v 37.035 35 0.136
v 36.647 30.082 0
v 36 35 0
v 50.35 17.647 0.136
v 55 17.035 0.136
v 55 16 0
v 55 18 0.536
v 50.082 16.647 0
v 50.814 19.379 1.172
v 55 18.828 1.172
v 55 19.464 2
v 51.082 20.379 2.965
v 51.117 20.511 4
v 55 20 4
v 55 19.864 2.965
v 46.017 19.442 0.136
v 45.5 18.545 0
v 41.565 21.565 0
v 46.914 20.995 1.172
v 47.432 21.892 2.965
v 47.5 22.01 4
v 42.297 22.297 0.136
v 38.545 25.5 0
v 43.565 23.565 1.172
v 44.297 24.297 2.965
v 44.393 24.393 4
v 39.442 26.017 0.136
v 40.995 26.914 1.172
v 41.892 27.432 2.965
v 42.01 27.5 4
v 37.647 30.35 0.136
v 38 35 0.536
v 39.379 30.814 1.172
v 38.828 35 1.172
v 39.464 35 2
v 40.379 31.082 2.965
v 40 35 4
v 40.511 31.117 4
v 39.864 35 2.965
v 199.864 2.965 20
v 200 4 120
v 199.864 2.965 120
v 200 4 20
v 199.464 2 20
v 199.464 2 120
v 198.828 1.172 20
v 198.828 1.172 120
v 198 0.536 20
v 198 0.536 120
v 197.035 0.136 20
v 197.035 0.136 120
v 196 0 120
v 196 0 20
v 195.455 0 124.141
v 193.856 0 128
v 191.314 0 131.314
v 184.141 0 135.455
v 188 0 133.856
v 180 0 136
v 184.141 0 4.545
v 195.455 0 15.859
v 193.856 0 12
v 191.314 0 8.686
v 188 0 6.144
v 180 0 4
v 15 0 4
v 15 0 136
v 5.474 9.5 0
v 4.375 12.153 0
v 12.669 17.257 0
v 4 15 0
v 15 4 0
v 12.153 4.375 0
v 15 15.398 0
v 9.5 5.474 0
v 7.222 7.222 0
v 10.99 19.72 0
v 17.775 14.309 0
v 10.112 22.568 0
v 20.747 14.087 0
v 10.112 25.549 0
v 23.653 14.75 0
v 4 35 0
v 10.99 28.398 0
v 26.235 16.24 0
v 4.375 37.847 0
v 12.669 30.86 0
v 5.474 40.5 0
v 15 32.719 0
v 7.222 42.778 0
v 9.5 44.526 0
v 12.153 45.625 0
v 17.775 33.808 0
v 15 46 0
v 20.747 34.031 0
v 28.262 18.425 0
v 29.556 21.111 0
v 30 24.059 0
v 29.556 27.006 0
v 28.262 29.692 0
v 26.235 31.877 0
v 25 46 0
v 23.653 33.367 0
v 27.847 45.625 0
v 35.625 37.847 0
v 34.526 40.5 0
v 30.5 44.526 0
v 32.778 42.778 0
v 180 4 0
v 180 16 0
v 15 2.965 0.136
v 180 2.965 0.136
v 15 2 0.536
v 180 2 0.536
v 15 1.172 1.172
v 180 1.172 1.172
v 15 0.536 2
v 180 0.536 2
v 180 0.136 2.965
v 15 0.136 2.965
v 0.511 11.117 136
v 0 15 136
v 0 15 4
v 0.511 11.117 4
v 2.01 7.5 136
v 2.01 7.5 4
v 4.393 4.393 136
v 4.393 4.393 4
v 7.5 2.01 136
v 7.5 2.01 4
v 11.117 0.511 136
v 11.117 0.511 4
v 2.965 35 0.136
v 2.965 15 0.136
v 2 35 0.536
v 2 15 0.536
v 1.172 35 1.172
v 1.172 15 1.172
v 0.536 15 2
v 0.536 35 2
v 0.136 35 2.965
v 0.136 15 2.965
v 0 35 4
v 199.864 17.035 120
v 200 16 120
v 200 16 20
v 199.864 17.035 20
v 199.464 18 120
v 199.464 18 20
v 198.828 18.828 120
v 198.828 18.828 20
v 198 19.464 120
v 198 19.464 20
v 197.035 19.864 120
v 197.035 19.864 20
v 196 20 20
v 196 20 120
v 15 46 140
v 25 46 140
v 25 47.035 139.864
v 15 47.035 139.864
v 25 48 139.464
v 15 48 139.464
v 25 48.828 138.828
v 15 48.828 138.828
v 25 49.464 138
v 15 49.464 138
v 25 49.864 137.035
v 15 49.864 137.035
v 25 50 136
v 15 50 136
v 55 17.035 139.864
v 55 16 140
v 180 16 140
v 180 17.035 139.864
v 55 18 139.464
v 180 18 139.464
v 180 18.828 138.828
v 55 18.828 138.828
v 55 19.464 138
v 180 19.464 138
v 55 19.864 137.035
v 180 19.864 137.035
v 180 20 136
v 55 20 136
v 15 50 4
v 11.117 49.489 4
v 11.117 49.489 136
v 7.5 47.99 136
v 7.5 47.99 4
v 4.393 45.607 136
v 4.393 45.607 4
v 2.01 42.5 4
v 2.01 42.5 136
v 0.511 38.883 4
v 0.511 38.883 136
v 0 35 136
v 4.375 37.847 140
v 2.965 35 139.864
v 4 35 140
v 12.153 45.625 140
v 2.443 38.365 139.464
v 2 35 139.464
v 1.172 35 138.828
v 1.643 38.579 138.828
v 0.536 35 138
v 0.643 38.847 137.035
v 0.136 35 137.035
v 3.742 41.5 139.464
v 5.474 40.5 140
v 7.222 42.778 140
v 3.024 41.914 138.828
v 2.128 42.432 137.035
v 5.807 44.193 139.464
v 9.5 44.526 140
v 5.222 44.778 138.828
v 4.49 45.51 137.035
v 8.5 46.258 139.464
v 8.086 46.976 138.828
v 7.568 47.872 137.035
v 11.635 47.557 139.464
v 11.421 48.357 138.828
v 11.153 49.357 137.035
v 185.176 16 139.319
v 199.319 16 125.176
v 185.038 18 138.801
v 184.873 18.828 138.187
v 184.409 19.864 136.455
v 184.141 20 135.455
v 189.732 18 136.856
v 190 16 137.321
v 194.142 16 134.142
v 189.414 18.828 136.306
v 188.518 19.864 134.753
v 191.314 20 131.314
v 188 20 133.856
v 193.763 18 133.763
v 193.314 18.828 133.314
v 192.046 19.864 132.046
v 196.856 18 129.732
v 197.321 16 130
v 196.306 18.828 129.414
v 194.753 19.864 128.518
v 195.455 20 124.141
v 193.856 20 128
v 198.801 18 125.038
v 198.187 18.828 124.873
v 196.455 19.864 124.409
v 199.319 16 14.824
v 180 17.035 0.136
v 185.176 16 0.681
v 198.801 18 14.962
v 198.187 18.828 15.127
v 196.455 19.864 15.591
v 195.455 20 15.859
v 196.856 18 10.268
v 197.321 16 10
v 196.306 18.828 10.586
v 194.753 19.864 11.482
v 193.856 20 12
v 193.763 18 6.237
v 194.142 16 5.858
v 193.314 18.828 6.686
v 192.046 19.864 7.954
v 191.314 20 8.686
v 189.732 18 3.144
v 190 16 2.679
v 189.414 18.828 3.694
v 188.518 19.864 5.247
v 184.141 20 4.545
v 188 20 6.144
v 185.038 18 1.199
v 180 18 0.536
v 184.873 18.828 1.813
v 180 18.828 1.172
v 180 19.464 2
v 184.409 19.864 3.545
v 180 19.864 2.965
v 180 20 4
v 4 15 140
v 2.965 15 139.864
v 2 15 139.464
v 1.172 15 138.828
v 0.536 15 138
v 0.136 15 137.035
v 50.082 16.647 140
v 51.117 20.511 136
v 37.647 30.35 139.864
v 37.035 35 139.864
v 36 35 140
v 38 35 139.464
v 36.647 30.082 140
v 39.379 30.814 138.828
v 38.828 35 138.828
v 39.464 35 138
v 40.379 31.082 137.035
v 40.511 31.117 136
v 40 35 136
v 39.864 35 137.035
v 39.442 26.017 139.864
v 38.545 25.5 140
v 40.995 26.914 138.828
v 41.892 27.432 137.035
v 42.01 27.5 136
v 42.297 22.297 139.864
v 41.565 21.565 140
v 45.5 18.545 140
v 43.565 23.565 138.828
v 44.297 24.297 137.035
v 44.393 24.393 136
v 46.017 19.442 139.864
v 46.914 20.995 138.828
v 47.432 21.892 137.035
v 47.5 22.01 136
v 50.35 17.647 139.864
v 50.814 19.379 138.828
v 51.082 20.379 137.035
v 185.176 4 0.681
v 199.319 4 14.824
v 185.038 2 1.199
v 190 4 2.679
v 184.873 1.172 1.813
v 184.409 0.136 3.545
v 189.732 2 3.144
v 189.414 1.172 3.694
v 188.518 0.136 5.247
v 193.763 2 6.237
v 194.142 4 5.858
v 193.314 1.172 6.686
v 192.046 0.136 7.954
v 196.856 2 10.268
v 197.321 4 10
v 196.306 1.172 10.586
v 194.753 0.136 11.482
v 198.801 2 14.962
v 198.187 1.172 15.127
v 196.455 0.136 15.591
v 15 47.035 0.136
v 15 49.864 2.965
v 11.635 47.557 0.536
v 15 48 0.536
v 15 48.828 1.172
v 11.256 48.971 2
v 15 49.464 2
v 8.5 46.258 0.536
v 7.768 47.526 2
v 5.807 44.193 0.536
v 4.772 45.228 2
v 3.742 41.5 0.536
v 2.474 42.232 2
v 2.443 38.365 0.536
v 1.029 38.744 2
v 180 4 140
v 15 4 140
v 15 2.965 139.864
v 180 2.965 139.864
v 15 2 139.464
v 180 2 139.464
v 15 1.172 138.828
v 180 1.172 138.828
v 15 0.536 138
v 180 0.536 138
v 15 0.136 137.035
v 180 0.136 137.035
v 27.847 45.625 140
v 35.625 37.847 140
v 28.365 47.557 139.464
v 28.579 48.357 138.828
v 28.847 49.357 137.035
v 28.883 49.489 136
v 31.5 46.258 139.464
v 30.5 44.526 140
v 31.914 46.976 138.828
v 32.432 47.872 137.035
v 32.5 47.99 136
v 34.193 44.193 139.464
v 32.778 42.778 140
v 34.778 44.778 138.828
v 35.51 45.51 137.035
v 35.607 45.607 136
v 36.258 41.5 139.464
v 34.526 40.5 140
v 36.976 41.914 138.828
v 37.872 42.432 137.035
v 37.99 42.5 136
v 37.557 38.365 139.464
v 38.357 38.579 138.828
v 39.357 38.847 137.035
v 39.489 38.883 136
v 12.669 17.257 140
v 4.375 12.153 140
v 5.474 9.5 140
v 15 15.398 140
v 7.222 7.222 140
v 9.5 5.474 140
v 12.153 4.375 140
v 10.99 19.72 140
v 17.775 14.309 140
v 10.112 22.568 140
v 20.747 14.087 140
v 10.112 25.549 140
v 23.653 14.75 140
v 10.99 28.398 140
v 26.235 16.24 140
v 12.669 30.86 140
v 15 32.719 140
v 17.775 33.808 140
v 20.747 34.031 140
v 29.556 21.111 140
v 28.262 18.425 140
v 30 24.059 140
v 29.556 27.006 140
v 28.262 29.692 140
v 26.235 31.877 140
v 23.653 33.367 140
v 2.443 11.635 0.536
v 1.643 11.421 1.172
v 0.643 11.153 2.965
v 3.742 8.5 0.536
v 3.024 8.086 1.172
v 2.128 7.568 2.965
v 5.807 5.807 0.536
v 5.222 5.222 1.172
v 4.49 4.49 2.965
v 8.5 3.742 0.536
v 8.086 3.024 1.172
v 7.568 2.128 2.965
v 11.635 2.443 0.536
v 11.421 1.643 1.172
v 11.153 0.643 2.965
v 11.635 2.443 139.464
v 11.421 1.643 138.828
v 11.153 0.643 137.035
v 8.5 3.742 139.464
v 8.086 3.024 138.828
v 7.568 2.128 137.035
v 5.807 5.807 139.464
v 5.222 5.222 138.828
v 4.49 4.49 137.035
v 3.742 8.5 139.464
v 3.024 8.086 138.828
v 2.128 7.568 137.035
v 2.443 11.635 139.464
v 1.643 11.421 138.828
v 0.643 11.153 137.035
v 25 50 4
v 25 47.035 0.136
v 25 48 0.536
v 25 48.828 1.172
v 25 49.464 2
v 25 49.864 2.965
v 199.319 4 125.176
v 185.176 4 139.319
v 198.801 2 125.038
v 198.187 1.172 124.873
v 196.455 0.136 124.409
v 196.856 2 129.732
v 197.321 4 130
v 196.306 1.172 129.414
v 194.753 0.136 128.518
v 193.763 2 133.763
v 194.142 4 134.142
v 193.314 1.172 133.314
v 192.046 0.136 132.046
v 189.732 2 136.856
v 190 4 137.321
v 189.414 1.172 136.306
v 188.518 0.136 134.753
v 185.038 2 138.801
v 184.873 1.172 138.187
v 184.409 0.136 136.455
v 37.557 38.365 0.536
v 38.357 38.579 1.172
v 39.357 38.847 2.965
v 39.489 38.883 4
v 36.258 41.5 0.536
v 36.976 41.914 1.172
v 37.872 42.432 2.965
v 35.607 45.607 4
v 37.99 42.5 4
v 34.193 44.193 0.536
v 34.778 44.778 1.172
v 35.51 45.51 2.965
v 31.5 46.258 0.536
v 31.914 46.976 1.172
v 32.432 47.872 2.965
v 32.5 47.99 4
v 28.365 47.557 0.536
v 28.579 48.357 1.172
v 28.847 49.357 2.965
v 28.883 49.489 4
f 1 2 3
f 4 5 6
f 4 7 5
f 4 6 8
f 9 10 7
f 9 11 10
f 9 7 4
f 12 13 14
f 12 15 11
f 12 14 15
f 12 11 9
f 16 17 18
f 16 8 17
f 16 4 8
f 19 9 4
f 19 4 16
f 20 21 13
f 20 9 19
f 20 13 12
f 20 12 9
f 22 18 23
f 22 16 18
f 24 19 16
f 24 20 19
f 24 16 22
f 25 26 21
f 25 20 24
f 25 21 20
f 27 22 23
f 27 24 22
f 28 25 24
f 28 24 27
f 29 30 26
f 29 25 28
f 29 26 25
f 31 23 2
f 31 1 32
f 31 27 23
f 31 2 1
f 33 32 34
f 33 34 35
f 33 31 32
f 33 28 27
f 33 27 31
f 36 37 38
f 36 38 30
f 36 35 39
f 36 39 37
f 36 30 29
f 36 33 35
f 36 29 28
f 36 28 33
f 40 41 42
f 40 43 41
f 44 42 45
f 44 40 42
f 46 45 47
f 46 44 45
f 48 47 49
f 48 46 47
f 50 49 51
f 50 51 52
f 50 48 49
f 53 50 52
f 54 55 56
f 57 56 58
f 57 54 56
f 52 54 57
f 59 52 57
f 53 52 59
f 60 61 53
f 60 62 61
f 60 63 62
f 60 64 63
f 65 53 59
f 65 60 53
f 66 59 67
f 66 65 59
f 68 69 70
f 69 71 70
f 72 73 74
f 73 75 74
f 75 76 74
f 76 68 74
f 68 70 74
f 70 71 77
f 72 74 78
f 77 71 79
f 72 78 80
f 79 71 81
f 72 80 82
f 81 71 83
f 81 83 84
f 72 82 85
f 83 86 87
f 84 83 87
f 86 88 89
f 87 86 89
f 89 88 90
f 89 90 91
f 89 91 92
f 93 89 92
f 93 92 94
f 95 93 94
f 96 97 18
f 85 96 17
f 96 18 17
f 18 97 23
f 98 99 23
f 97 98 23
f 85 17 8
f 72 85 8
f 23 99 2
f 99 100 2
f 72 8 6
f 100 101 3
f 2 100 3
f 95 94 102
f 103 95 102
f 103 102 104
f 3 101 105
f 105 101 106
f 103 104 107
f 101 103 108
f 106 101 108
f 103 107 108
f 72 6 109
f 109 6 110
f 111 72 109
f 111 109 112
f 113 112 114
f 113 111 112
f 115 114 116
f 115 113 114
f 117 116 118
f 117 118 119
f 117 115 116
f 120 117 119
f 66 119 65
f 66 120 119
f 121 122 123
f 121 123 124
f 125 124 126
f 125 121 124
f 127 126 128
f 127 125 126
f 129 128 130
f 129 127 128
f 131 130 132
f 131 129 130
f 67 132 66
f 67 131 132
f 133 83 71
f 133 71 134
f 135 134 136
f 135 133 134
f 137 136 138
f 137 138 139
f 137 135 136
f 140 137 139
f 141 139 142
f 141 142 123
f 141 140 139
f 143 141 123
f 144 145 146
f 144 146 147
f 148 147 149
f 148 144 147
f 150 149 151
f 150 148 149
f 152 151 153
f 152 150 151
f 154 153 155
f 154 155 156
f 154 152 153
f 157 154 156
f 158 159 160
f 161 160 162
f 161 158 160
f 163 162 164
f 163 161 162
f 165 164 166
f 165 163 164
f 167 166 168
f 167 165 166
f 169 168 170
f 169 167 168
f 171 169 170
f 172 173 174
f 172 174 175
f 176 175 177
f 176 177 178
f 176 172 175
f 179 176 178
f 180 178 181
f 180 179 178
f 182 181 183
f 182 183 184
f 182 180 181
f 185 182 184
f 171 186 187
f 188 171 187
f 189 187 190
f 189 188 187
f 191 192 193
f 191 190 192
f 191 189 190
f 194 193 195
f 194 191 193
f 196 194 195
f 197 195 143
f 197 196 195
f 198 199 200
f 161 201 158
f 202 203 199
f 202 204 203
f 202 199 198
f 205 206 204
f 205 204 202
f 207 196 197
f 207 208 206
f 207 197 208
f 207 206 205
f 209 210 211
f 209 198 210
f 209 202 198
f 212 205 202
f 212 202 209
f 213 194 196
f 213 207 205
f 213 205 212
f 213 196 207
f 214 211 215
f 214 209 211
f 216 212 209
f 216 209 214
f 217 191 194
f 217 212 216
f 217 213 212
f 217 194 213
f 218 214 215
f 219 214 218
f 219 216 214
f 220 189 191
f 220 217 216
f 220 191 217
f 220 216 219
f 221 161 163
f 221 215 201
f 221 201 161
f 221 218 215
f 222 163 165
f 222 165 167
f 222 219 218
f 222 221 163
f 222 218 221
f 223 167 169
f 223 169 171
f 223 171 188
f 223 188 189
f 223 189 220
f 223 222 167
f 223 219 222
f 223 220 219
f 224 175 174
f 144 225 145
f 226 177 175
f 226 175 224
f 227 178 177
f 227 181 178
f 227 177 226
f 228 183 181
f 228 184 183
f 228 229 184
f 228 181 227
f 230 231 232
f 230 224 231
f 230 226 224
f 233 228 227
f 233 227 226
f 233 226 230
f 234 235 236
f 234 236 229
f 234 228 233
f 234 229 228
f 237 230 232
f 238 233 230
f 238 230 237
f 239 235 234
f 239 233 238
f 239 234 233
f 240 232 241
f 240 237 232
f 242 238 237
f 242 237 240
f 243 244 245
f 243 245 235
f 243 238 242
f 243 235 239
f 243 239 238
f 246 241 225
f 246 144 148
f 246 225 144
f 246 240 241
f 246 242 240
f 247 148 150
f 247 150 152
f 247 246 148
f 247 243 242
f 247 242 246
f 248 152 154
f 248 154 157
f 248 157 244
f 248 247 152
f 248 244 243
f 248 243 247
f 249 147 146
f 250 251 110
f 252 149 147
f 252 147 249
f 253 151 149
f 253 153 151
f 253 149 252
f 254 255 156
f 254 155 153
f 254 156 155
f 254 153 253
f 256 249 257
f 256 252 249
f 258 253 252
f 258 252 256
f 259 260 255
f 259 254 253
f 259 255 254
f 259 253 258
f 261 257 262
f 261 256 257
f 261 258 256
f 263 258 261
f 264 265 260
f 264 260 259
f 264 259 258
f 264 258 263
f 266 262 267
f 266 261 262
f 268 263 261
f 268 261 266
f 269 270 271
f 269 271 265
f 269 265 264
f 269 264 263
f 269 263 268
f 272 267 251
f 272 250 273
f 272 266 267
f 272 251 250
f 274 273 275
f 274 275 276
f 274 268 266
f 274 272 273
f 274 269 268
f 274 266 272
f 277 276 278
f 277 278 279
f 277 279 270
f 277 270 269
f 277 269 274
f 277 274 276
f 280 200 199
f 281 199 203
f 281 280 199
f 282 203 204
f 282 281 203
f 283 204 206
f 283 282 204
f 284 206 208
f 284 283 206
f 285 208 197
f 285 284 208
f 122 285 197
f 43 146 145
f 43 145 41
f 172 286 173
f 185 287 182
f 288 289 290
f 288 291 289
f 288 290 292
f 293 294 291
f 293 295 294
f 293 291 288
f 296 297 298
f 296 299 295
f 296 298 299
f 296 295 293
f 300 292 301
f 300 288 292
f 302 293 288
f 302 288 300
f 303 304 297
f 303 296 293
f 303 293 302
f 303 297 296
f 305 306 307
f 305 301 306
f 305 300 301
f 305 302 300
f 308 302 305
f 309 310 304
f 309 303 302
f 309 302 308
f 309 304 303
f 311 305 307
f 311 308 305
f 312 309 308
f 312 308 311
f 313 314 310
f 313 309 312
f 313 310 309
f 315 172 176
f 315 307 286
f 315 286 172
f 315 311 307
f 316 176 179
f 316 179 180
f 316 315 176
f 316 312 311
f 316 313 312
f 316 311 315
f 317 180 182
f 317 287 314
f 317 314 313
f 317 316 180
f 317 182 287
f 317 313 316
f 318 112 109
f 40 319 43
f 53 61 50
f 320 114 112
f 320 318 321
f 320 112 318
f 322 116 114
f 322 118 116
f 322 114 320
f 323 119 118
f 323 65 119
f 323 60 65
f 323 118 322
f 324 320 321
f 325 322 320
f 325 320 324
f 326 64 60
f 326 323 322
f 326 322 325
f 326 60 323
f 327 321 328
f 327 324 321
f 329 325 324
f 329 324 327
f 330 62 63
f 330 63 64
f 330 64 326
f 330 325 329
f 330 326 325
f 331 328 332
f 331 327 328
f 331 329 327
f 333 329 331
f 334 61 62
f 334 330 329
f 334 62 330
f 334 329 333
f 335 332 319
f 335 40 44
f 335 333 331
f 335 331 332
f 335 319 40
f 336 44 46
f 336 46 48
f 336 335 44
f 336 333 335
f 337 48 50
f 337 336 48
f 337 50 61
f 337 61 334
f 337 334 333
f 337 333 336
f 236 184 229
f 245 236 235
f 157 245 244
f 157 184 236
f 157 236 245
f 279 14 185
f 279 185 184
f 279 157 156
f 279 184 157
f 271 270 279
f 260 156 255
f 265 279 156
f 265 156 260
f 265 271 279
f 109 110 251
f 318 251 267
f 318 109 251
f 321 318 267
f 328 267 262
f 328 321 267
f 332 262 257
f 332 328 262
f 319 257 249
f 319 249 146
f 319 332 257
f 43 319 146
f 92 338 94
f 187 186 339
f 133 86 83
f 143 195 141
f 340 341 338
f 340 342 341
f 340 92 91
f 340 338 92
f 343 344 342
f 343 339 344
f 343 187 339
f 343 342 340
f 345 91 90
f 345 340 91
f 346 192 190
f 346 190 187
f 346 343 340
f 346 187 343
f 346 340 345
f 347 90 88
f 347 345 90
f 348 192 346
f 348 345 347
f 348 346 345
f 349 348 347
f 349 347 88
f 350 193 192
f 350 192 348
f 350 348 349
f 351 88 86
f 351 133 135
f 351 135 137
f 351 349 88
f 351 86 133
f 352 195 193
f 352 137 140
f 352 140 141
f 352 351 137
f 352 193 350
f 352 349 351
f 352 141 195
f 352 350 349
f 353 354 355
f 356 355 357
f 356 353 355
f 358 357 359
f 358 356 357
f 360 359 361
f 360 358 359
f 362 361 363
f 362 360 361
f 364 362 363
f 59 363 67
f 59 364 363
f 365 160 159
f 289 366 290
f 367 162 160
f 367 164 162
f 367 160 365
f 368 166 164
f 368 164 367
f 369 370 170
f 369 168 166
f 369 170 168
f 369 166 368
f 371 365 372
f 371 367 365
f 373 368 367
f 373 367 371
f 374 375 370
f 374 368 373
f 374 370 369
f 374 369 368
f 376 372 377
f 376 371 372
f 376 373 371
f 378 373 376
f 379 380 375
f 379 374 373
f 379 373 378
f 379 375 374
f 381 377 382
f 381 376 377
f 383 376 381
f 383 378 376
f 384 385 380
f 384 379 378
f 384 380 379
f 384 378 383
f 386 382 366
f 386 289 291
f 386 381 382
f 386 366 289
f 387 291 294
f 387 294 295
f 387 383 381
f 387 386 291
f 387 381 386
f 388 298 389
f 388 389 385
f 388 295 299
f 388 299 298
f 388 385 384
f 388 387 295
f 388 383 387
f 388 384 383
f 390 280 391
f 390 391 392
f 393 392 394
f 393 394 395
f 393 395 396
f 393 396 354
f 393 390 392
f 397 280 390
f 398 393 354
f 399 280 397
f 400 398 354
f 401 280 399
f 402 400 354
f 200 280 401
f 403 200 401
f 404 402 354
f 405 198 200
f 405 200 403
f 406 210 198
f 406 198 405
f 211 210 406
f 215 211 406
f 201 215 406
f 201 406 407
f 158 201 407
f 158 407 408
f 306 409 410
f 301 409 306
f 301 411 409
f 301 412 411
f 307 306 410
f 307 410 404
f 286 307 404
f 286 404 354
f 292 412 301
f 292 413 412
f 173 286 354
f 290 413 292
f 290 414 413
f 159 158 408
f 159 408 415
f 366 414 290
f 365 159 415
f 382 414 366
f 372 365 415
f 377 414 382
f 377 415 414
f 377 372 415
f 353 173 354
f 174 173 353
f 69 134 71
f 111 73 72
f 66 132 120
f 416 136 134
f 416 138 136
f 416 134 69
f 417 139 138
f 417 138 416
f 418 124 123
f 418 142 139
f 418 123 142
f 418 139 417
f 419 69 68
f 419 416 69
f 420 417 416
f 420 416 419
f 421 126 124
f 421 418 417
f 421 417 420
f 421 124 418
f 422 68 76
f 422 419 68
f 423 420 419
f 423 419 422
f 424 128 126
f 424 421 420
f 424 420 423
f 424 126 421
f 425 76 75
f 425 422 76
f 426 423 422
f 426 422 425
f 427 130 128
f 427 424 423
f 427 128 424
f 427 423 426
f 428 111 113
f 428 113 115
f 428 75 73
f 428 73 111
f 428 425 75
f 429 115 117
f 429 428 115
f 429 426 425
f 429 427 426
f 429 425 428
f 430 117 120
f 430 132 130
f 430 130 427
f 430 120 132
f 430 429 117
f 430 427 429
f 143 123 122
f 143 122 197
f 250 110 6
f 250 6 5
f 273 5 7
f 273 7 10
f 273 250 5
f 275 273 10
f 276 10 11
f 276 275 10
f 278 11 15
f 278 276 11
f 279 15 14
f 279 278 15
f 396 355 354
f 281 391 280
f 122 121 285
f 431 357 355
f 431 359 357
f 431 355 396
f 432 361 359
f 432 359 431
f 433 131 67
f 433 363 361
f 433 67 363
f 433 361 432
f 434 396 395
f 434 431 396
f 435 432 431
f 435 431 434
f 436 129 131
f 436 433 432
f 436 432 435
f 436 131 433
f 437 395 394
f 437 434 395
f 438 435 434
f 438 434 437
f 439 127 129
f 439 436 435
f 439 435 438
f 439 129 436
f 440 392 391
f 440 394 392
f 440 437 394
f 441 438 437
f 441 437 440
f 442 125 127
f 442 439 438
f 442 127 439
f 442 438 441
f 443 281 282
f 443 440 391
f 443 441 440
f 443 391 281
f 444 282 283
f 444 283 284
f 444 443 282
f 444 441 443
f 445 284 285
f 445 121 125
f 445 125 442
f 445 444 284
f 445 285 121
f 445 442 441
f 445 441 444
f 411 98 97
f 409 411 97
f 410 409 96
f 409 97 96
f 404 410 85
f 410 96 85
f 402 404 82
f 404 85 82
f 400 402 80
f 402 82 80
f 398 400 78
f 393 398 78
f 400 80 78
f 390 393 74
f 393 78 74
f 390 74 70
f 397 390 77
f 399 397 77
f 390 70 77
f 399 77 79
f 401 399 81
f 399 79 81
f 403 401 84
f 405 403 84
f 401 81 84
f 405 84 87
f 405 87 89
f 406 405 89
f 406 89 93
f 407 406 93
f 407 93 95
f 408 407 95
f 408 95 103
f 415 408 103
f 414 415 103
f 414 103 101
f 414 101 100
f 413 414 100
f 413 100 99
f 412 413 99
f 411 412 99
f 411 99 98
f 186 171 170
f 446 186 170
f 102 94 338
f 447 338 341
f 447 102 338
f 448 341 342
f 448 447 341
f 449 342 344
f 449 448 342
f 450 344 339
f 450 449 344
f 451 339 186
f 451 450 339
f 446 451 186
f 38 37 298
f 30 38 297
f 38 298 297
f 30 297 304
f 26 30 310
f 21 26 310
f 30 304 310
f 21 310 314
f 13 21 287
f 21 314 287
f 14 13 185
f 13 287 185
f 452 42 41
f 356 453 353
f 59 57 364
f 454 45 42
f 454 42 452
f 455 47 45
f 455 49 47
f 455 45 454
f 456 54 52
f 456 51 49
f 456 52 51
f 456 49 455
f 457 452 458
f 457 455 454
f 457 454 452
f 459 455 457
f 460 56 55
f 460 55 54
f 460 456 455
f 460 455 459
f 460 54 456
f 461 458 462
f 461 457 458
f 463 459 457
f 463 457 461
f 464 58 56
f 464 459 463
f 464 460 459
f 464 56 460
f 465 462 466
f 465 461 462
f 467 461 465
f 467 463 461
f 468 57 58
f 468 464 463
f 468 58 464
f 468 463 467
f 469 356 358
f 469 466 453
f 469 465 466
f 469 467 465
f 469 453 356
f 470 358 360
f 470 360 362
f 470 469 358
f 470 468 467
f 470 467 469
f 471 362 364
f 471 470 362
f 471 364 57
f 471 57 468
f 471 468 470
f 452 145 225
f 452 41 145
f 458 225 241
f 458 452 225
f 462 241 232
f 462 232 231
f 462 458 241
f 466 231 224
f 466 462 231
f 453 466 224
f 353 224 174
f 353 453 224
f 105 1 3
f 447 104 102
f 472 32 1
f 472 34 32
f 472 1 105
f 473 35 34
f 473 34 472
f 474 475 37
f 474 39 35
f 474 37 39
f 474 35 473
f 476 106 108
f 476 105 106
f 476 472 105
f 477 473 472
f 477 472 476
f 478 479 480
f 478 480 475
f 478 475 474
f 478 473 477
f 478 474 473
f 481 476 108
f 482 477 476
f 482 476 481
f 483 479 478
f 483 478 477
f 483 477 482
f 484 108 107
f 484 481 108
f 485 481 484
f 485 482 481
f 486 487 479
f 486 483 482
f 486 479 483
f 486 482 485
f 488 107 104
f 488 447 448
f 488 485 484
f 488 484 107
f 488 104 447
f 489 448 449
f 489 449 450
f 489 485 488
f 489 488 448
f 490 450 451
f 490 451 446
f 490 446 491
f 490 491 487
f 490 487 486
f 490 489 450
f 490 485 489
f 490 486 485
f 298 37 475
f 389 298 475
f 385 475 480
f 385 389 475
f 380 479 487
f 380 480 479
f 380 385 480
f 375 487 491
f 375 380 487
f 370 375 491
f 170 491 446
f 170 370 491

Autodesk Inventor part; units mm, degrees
ref_plane "YZ Plane" through (0, 0, 0) normal (1, 0, 0) x (0, 1, 0)
ref_plane "XZ Plane" through (0, 0, 0) normal (0, 1, 0) x (-1, 0, 0)
ref_plane "XY Plane" through (0, 0, 0) normal (0, 0, 1) x (1, 0, 0)
sketch "Sketch1" plane through (0, 0, 0) normal (0, 0, 1) x (1, 0, 0)
  line L0 (0, 0) -> (0, 50)
  line L1 (0, 50) -> (40, 50)
  line L2 (40, 50) -> (40, 20)
  line L3 (40, 20) -> (200, 20)
  line L4 (200, 20) -> (200, 0)
  line L5 (200, 0) -> (0, 0)
  line L6 (20, 50) -> (20, -1.8826)
  line L7 (20, -1.8826) -> (20, 0)
  circle A0 centre (20, 24.0587) radius 10
  dimension "d0" = 200
  dimension "d1" = 50
  dimension "d2" = 40
  dimension "d3" = 20
  dimension "d4" = 20
extrude "Extrusion1" add sketch "Sketch1" along normal blind 140 contours L0 L1 L6 A0 L5 | L6 A0 L1 L2 L3 L4 L5
fillet "Fillet1" radius 15 4 edges at (0, 50, 70) (40, 50, 70) (40, 20, 70) (0, 0, 70)
fillet "Fillet2" radius 20 2 edges at (200, 10, 140) (200, 10, 0)
fillet "Fillet3" radius 4 22 edges at (4.3933, 45.6067, 0) (0, 25, 0) (4.3933, 4.3933, 0) (97.4998, 0, 0) (194.1421, 0, 5.8579) (200, 0, 70) (194.1421, 0, 134.1421) (97.4998, 0, 140) (4.3933, 4.3933, 140) (0, 25, 140) (4.3933, 45.6067, 140) (20, 50, 140) (35.6067, 45.6067, 140) (40, 35, 140) (117.4998, 20, 140) (194.1421, 20, 134.1421) (200, 20, 70) (194.1421, 20, 5.8579) (117.4998, 20, 0) (40, 35, 0) (35.6067, 45.6067, 0) (20, 50, 0)
properties part number "foot rest EG26"
